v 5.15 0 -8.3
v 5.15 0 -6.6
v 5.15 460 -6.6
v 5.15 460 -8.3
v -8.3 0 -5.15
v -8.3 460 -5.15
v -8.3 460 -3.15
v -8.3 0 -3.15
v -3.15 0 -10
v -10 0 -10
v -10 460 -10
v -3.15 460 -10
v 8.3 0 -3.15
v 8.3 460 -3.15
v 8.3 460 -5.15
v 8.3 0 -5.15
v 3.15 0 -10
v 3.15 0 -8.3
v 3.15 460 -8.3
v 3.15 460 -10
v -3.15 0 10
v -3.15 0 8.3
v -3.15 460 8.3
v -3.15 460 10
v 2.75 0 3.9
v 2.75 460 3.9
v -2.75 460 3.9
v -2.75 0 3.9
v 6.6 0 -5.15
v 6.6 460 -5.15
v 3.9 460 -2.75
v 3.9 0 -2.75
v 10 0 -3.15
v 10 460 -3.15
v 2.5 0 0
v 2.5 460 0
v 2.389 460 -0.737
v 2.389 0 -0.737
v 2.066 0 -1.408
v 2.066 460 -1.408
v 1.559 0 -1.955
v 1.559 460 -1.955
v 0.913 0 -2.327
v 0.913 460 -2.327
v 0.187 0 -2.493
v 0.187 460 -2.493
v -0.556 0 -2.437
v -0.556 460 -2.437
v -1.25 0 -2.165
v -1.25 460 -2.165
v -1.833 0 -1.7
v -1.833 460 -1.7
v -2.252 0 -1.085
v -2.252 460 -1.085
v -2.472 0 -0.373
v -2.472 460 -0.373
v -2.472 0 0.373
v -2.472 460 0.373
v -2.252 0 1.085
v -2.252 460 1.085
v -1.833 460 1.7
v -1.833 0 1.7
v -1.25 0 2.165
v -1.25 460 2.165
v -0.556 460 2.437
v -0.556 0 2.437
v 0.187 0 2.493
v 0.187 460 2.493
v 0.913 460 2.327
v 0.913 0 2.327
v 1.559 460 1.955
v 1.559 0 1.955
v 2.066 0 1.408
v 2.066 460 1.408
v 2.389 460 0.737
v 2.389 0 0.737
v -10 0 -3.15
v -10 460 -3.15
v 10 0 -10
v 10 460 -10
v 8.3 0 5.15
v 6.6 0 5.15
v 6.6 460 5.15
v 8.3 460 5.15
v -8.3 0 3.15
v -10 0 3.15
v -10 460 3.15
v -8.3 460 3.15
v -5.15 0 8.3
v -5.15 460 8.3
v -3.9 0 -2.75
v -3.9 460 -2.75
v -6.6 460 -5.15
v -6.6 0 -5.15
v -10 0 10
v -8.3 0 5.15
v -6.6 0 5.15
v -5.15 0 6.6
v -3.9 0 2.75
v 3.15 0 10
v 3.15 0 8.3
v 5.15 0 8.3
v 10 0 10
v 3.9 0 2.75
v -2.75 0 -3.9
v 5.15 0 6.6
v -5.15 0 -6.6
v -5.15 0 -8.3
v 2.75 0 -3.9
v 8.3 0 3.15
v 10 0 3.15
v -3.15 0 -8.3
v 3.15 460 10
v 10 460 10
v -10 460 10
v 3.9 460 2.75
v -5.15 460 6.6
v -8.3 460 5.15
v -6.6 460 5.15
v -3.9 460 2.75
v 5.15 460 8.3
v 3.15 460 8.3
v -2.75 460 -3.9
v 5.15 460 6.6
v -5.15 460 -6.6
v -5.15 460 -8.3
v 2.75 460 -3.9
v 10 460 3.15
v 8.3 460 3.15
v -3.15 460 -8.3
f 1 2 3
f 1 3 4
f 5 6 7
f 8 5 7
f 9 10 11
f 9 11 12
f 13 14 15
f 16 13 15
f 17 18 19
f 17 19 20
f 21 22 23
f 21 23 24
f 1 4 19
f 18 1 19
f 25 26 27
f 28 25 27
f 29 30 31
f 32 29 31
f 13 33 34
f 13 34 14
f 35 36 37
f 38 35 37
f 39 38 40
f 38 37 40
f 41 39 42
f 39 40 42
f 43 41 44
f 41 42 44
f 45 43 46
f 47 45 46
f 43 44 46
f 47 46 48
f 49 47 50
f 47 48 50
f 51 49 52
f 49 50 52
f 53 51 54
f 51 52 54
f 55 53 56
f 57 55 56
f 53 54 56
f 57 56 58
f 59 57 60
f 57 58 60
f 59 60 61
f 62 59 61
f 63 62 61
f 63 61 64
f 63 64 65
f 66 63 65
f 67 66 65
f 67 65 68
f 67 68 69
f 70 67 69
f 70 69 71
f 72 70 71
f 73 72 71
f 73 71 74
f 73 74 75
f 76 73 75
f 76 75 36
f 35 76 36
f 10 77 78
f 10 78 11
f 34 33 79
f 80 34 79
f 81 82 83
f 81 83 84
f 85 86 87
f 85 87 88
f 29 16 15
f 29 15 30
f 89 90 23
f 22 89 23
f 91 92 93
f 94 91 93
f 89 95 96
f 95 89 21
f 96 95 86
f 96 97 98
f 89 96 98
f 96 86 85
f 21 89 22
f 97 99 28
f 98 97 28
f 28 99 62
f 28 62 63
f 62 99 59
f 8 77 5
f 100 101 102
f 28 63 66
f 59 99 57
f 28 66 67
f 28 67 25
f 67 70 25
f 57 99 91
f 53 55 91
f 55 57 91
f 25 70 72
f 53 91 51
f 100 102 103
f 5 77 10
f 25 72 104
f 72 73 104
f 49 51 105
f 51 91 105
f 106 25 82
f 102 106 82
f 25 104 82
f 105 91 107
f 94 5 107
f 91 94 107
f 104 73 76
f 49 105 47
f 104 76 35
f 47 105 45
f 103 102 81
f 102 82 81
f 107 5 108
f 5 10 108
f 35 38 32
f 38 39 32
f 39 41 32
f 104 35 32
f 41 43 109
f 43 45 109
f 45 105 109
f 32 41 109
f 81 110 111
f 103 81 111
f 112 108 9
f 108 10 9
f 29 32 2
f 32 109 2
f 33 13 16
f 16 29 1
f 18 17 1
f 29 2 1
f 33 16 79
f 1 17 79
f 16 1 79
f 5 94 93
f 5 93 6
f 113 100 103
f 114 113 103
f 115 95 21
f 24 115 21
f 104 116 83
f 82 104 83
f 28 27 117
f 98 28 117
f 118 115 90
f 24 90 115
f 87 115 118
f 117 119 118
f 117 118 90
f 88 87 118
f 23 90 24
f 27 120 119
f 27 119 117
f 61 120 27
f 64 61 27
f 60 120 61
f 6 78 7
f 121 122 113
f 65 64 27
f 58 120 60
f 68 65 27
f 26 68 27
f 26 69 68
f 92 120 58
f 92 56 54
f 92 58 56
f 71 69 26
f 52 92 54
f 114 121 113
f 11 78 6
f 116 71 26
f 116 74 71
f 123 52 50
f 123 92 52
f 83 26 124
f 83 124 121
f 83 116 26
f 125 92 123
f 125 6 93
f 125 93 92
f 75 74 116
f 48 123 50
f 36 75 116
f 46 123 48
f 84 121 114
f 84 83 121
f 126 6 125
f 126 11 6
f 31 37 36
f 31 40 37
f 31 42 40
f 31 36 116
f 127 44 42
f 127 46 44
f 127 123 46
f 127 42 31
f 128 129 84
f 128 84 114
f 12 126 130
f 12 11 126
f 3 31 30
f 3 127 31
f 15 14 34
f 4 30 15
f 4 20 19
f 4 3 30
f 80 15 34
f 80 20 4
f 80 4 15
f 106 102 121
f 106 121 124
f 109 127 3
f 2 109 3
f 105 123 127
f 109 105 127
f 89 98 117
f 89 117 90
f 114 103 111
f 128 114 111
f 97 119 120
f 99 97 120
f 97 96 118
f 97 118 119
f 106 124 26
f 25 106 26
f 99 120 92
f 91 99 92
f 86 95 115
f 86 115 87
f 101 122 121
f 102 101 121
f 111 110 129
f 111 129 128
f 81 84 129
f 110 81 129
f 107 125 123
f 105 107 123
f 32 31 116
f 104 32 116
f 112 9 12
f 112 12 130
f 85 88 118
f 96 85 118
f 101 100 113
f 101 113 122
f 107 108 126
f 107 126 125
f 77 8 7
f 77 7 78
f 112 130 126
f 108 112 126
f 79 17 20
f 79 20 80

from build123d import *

# Parameters (mm, degrees)
SKETCH_1_W          = 20
SKETCH_1_H          = 20
EXTRUDE_1_DEPTH     = 460
SKETCH_2_R          = 2.5
CUT_EXTRUDE_1_DEPTH = 461


with BuildPart() as part:
    # 草图1 → 凸台-拉伸1 (new body)
    with BuildSketch(Plane(origin=(0, 0, 0), x_dir=(1, 0, 0), z_dir=(0, 1, 0))):
        Rectangle(SKETCH_1_W, SKETCH_1_H)
    extrude(amount=EXTRUDE_1_DEPTH)

    # 草图2 → 切除-拉伸1 (cut, through all)
    with BuildSketch(Plane(origin=(0, 460, 0), x_dir=(1, 0, 0), z_dir=(0, 1, 0))):
        Circle(SKETCH_2_R)
        Polygon((-3.15, 10), (-3.15, 8.3), (-5.15, 8.3), (-5.15, 6.6), (-2.75, 3.9), (2.75, 3.9), (5.15, 6.6), (5.15, 8.3), (3.15, 8.3), (3.15, 10), align=None)
        Polygon((3.9, 2.75), (3.9, -2.75), (6.6, -5.15), (8.3, -5.15), (8.3, -3.15), (10, -3.15), (10, 3.15), (8.3, 3.15), (8.3, 5.15), (6.6, 5.15), align=None)
        Polygon((2.75, -3.9), (-2.75, -3.9), (-5.15, -6.6), (-5.15, -8.3), (-3.15, -8.3), (-3.15, -10), (3.15, -10), (3.15, -8.3), (5.15, -8.3), (5.15, -6.6), align=None)
        Polygon((-3.9, -2.75), (-3.9, 2.75), (-6.6, 5.15), (-8.3, 5.15), (-8.3, 3.15), (-10, 3.15), (-10, -3.15), (-8.3, -3.15), (-8.3, -5.15), (-6.6, -5.15), align=None)
    extrude(amount=-CUT_EXTRUDE_1_DEPTH, mode=Mode.SUBTRACT)


solid = part.part
